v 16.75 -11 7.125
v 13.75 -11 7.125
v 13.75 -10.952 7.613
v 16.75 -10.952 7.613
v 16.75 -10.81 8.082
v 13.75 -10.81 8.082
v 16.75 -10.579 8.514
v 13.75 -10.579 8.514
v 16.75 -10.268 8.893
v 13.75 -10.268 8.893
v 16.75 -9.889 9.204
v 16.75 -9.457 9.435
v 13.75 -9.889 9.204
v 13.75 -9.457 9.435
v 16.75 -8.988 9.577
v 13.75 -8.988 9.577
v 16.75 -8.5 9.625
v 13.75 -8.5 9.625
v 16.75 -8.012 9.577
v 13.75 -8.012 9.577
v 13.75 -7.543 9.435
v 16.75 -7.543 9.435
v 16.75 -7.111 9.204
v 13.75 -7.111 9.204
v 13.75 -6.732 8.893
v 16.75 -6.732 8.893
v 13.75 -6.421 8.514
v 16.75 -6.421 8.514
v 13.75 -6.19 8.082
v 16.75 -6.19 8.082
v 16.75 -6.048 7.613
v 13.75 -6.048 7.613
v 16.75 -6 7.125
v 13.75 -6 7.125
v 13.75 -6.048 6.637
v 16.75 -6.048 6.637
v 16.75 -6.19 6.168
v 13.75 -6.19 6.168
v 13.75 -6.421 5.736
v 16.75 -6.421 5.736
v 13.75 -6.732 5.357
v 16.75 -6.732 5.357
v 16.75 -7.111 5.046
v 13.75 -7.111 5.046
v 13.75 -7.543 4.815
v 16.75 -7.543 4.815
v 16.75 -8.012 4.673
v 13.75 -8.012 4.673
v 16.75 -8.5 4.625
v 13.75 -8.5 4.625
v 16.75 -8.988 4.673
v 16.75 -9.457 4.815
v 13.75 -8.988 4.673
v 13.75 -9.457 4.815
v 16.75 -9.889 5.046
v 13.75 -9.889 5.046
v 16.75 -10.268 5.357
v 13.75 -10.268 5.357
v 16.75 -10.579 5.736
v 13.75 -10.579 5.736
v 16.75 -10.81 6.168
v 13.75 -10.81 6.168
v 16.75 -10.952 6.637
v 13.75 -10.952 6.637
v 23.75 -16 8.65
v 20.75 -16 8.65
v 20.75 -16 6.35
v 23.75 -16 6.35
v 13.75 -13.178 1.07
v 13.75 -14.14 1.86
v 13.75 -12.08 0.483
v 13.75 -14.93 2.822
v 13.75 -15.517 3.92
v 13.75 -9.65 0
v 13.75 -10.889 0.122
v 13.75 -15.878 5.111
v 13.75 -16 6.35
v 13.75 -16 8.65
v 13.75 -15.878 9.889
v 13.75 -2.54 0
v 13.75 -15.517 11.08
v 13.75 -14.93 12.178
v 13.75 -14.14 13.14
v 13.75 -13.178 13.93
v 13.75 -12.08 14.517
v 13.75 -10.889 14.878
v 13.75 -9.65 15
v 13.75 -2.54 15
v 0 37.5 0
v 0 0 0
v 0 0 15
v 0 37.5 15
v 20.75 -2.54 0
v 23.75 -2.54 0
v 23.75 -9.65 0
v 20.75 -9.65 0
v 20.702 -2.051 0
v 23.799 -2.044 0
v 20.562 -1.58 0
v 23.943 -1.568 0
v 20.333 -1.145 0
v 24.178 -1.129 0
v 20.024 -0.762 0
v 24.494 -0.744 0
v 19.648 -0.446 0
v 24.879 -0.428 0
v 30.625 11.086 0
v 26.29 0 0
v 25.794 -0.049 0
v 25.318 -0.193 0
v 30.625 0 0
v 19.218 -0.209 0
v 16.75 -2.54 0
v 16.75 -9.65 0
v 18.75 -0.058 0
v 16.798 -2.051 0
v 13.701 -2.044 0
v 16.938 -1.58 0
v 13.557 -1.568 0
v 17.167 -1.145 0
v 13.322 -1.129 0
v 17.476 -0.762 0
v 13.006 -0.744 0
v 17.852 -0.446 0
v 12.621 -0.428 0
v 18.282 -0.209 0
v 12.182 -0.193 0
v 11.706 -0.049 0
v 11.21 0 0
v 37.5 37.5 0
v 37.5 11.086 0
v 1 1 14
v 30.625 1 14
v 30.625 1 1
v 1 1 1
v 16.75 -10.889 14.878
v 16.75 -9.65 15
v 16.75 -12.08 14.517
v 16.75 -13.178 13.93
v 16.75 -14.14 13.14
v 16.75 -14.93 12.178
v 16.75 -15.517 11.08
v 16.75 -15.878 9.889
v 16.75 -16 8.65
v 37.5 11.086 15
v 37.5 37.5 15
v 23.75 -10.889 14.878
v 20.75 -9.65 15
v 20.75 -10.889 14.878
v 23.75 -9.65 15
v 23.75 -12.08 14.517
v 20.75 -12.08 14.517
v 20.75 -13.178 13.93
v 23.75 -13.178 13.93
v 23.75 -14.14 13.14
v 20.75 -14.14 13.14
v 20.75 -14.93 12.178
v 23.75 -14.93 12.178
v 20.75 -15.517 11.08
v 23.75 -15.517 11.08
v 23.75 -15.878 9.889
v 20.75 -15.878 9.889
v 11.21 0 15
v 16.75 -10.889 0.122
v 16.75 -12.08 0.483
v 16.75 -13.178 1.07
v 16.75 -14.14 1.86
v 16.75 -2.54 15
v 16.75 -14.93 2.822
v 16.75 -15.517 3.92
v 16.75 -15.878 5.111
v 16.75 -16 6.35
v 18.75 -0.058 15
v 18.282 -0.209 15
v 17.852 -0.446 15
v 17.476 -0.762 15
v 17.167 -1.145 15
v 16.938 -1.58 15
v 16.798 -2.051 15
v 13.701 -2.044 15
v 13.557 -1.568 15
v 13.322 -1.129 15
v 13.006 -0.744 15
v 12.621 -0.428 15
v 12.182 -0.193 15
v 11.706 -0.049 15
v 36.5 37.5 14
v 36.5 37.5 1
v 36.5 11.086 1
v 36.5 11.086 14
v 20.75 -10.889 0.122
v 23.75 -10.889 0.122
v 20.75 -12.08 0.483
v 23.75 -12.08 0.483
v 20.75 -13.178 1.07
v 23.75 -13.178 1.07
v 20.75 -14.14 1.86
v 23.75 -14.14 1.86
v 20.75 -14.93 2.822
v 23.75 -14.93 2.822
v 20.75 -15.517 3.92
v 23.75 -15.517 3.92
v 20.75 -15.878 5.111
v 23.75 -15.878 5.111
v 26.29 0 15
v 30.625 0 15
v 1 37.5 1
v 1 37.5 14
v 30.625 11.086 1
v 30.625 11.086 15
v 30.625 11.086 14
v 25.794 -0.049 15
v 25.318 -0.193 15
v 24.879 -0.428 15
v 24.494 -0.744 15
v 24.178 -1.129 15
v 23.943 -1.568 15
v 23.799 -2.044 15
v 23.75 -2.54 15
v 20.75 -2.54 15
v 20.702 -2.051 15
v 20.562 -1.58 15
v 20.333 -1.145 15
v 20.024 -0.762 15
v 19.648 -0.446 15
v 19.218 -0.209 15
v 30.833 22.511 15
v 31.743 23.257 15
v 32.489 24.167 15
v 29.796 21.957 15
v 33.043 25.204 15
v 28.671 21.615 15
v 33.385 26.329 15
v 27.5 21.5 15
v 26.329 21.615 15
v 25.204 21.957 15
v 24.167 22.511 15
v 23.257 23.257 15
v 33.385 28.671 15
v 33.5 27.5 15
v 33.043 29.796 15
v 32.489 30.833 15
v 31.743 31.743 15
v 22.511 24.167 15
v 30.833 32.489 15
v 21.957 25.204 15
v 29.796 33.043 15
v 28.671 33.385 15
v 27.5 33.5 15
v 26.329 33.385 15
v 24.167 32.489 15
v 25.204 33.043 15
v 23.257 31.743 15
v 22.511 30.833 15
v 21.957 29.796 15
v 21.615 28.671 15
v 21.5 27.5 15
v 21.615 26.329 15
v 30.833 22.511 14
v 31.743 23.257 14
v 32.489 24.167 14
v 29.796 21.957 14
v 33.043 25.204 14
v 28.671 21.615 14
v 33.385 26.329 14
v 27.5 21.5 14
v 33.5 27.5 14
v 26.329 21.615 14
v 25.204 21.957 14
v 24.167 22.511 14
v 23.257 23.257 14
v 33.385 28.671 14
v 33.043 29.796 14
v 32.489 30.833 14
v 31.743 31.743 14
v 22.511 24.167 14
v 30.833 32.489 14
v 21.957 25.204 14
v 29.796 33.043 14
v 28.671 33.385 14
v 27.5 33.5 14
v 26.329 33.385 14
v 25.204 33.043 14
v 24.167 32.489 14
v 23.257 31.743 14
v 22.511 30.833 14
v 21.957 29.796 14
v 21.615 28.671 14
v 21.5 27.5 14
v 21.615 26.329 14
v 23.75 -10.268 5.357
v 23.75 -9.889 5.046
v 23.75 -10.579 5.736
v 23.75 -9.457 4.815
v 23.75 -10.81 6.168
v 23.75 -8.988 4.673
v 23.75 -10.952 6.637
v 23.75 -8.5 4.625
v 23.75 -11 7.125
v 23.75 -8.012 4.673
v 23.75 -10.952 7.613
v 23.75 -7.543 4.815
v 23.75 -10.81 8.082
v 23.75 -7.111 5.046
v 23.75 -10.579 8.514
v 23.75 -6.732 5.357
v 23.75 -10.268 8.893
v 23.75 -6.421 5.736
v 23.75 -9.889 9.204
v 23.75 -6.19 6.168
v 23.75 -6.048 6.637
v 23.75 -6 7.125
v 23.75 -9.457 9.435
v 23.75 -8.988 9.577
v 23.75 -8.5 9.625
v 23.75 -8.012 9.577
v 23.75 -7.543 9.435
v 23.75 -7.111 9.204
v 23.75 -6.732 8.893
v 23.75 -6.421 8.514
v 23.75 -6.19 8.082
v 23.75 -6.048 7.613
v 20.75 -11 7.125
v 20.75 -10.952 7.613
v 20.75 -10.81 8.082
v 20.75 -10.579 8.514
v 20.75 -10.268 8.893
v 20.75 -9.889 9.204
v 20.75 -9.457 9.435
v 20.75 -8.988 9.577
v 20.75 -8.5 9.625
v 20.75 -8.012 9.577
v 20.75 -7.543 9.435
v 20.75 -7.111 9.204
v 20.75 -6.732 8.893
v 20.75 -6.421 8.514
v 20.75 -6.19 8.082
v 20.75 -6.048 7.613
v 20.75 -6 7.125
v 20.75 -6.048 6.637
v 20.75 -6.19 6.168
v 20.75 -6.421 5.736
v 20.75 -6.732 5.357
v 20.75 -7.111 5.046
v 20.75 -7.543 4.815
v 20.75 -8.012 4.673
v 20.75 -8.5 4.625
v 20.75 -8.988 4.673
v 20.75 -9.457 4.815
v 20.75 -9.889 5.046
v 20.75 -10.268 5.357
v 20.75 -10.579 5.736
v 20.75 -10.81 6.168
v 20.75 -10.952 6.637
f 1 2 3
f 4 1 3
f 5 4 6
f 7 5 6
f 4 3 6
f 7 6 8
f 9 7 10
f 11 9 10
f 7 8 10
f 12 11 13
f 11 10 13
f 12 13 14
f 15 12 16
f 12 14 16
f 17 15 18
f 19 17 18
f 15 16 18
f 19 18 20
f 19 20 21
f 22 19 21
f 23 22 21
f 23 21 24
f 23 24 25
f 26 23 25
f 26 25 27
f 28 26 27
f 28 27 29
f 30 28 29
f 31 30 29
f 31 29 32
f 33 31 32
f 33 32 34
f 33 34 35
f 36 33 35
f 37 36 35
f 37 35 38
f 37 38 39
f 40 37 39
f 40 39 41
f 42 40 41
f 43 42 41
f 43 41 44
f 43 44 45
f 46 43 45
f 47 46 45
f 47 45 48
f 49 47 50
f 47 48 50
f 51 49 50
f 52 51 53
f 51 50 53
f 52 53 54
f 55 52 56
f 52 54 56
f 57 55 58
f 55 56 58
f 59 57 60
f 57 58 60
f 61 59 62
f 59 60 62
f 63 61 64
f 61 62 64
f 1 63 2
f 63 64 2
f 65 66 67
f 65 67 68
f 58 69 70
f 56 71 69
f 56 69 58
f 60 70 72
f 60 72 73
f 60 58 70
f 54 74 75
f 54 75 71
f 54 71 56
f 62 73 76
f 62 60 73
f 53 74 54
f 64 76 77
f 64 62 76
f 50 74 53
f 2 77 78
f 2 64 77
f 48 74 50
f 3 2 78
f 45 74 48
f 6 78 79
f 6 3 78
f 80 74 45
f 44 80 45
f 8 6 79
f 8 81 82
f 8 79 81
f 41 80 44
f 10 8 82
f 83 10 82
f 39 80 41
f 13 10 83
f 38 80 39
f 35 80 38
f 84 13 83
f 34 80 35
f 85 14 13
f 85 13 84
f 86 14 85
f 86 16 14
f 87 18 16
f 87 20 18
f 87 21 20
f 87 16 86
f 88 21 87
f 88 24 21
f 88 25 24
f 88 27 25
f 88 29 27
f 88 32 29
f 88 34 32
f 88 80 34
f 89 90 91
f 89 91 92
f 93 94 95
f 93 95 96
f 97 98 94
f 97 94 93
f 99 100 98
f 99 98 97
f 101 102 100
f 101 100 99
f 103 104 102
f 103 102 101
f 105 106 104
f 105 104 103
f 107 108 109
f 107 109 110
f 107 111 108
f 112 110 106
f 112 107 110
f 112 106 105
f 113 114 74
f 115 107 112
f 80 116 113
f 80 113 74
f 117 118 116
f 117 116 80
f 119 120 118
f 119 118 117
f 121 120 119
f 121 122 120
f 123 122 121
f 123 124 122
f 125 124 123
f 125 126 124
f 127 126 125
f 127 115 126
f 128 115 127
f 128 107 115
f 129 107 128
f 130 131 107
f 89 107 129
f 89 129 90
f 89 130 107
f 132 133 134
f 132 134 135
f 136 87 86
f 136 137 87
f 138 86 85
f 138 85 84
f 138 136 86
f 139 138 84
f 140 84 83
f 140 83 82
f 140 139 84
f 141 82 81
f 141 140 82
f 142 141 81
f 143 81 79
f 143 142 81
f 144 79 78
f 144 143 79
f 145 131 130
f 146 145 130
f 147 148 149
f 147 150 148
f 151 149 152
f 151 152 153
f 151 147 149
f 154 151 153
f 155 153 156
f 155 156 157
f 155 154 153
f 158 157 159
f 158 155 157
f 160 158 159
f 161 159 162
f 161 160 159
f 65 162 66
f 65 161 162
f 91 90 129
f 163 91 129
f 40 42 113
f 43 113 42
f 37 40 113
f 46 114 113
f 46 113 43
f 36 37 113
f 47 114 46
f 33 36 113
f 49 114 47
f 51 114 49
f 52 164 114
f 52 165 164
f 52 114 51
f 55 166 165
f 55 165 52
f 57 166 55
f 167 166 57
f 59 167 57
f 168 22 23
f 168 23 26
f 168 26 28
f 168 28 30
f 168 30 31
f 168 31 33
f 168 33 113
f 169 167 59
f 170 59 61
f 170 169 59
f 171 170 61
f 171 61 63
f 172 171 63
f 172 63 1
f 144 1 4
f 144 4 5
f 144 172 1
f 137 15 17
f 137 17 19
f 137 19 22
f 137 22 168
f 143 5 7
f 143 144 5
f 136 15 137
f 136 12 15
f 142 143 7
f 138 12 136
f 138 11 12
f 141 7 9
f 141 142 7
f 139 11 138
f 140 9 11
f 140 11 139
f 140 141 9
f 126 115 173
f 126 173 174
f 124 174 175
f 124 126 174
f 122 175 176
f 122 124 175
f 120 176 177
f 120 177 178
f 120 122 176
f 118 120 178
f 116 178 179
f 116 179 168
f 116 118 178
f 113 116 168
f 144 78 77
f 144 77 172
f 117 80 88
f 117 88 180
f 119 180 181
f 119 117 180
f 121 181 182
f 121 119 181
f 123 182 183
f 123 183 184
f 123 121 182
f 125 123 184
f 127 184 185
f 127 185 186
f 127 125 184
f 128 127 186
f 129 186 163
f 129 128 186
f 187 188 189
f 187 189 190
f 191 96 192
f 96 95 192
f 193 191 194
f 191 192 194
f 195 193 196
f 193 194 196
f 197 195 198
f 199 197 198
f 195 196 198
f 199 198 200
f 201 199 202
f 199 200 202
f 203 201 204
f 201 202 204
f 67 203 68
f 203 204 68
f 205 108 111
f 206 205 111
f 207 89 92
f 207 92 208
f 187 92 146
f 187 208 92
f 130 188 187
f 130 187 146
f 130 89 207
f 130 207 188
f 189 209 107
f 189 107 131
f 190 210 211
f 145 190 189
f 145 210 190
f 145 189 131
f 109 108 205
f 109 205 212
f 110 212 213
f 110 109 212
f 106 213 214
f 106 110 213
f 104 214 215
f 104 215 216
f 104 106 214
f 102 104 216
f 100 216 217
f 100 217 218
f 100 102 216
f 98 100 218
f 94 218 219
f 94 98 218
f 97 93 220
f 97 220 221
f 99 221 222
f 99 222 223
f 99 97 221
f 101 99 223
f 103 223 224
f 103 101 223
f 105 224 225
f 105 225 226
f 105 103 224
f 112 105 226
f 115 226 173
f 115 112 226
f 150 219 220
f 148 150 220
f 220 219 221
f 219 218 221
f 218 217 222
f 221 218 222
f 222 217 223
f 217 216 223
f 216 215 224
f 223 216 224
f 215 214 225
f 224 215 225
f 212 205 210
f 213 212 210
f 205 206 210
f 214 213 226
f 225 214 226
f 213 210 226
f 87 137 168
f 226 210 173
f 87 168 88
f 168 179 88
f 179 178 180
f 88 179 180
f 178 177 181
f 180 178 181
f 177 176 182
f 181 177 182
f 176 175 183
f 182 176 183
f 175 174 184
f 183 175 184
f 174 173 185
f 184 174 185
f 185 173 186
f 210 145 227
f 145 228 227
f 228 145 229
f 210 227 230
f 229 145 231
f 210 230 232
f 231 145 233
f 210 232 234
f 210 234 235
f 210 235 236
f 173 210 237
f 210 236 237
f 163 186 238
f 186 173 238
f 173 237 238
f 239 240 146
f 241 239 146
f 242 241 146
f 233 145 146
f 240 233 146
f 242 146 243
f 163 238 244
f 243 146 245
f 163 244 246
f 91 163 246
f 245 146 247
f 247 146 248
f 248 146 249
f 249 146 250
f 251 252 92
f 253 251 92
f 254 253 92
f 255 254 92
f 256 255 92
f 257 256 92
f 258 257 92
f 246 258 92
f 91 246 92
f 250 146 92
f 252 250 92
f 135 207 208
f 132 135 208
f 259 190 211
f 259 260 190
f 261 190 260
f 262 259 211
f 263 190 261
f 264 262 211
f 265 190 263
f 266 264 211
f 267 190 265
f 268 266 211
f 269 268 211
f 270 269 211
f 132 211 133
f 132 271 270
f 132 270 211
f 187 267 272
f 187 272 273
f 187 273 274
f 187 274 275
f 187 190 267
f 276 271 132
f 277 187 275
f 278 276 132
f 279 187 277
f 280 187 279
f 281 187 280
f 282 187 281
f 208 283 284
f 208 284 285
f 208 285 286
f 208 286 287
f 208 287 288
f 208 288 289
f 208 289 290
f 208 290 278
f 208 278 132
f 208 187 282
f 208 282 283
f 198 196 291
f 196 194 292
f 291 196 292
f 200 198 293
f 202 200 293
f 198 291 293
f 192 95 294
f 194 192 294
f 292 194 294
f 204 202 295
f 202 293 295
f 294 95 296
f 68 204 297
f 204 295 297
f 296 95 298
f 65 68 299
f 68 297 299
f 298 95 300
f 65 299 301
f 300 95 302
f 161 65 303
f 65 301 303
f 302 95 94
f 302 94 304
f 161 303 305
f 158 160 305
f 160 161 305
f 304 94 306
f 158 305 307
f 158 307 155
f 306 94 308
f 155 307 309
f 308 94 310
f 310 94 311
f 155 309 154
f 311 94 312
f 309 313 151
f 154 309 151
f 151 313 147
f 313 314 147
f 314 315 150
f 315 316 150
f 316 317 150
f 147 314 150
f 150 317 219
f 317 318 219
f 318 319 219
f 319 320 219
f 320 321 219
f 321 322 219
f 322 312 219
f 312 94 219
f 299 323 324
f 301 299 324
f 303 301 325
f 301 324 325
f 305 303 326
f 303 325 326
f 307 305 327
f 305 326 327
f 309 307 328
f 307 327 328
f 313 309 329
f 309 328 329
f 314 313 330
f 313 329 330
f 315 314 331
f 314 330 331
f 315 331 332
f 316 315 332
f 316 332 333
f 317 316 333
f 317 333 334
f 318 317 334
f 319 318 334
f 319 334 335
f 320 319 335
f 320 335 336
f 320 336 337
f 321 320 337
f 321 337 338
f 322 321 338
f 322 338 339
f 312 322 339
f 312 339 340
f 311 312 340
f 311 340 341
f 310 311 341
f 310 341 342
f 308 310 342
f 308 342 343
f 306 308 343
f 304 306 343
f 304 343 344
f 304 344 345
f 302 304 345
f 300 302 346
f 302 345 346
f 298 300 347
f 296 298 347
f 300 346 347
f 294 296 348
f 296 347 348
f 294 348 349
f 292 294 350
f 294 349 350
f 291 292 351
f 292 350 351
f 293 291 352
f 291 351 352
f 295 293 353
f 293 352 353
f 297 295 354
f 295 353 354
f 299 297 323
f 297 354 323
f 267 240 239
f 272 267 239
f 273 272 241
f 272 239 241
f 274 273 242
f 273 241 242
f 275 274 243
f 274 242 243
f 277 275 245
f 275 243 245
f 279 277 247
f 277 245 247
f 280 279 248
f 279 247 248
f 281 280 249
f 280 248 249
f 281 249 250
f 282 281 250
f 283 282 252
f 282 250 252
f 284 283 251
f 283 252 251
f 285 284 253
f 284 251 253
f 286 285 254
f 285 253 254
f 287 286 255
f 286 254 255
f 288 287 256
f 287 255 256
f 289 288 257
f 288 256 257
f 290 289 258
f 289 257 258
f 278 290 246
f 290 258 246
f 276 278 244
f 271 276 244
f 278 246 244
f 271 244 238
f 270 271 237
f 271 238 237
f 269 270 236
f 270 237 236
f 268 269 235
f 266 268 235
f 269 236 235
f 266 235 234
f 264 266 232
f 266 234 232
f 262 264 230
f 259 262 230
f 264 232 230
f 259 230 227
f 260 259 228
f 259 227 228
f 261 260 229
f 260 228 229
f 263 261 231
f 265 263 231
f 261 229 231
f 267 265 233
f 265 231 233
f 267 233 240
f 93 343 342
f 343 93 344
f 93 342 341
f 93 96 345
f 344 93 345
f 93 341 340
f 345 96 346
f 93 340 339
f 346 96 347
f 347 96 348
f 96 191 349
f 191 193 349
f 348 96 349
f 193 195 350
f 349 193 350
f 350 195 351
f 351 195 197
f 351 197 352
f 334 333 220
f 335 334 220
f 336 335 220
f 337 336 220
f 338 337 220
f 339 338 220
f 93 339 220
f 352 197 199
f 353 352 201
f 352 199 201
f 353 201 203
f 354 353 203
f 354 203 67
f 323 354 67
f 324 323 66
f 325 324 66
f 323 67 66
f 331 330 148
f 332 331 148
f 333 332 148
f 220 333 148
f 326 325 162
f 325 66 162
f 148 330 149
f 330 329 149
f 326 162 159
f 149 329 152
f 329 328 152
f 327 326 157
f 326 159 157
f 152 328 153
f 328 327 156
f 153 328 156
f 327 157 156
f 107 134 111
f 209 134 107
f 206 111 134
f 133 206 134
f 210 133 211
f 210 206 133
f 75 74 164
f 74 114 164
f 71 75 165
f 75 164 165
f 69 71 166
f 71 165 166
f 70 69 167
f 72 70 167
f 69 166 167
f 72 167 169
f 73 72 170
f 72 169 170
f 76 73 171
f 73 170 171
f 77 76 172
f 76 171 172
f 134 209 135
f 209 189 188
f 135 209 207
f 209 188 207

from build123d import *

# Parameters (mm, degrees)
F0_W         = 37.5
F0_H         = 37.5
F1_DEPTH     = 15
F2_W         = 35.5
F2_H         = 13
F3_DEPTH     = 36.5
F4_R         = 6
F5_DEPTH     = 1
F6_W         = 10
F6_H         = 15
F7_DEPTH     = 16
F8_R         = 2.5
F9_DEPTH     = 25.4
F10_W        = 4
F10_H        = 15
F11_DEPTH    = 16
F12_R        = 6.35
F13_W        = 6.875
F13_H        = 11.0862404108
F14_DEPTH    = 25.4
F15_T1_DEPTH = 15


# Not quite as in the source:
# - a fillet or chamfer that OpenCascade refuses, or shapes differently, is made with other operations: its cross-section is extruded or revolved along the edge and cut away or added


with BuildPart() as f1:
    # F0 (on Top) → F1 (new body)
    with BuildSketch(Plane.XY):
        with Locations((18.75, 18.75)):
            Rectangle(F0_W, F0_H)
    extrude(amount=F1_DEPTH)

    # F2 (on face) → F3 (cut)
    with BuildSketch(Plane(origin=(0, 37.5, 0), x_dir=(-1, 0, 0), z_dir=(0, 1, 0))):
        with Locations((-18.75, 7.5)):
            Rectangle(F2_W, F2_H)
    extrude(amount=-F3_DEPTH, mode=Mode.SUBTRACT)

    # F4 (on face) → F5 (cut, through all)
    with BuildSketch(Plane.XY.offset(15)):
        with Locations((27.5, 27.5)):
            Circle(F4_R)
    extrude(amount=-F5_DEPTH, mode=Mode.SUBTRACT)

    # F6 (on face) → F7 (join)
    with BuildSketch(Plane.XZ):
        with Locations((18.75, 7.5)):
            Rectangle(F6_W, F6_H)
    extrude(amount=F7_DEPTH)

    # F8 (on face) → F9 (cut)
    with BuildSketch(Plane(origin=(13.75, 0, 0), x_dir=(0, -1, 0), z_dir=(-1, 0, 0))):
        with Locations((8.5, 7.125)):
            Circle(F8_R)
    extrude(amount=-F9_DEPTH, mode=Mode.SUBTRACT)

    # F10 (on face) → F11 (cut)
    with BuildSketch(Plane.XZ.offset(16)):
        with Locations((18.75, 7.5)):
            Rectangle(F10_W, F10_H)
    extrude(amount=-F11_DEPTH, mode=Mode.SUBTRACT)

    # F12
    f12_edges = [f1.edges().sort_by_distance(p)[0] for p in [
        (15.25, -16, 15),
        (22.25, -16, 15),
        (22.25, -16, 0),
        (15.25, -16, 0),
    ]]
    fillet(f12_edges, radius=F12_R)

    # F13 (on face) → F14 (cut)
    with BuildSketch(Plane.XY.offset(15)):
        with Locations((34.0625, 5.5431202054)):
            Rectangle(F13_W, F13_H)
    extrude(amount=-F14_DEPTH, mode=Mode.SUBTRACT)

    # F15: fillet of radius 2.54 on 4 edges, made by hand

    # F15_s2 → F15_t1 (join)
    with BuildSketch(Plane.XY):
        with BuildLine():
            ThreePointArc((26.29, 0), (24.4939487758, -0.7439487758), (23.75, -2.54))
            Line((23.75, -2.54), (23.75, 0))
            Line((23.75, 0), (26.29, 0))
        make_face()
        with BuildLine():
            ThreePointArc((20.75, -2.54), (20.0060512242, -0.7439487758), (18.21, 0))
            Line((18.21, 0), (20.75, 0))
            Line((20.75, 0), (20.75, -2.54))
        make_face()
        with BuildLine():
            ThreePointArc((13.75, -2.54), (13.0060512242, -0.7439487758), (11.21, 0))
            Line((11.21, 0), (13.75, 0))
            Line((13.75, 0), (13.75, -2.54))
        make_face()
        with BuildLine():
            ThreePointArc((19.29, 0), (17.4939487758, -0.7439487758), (16.75, -2.54))
            Line((16.75, -2.54), (16.75, 0))
            Line((16.75, 0), (19.29, 0))
        make_face()
    extrude(amount=F15_T1_DEPTH)


solid = f1.part
